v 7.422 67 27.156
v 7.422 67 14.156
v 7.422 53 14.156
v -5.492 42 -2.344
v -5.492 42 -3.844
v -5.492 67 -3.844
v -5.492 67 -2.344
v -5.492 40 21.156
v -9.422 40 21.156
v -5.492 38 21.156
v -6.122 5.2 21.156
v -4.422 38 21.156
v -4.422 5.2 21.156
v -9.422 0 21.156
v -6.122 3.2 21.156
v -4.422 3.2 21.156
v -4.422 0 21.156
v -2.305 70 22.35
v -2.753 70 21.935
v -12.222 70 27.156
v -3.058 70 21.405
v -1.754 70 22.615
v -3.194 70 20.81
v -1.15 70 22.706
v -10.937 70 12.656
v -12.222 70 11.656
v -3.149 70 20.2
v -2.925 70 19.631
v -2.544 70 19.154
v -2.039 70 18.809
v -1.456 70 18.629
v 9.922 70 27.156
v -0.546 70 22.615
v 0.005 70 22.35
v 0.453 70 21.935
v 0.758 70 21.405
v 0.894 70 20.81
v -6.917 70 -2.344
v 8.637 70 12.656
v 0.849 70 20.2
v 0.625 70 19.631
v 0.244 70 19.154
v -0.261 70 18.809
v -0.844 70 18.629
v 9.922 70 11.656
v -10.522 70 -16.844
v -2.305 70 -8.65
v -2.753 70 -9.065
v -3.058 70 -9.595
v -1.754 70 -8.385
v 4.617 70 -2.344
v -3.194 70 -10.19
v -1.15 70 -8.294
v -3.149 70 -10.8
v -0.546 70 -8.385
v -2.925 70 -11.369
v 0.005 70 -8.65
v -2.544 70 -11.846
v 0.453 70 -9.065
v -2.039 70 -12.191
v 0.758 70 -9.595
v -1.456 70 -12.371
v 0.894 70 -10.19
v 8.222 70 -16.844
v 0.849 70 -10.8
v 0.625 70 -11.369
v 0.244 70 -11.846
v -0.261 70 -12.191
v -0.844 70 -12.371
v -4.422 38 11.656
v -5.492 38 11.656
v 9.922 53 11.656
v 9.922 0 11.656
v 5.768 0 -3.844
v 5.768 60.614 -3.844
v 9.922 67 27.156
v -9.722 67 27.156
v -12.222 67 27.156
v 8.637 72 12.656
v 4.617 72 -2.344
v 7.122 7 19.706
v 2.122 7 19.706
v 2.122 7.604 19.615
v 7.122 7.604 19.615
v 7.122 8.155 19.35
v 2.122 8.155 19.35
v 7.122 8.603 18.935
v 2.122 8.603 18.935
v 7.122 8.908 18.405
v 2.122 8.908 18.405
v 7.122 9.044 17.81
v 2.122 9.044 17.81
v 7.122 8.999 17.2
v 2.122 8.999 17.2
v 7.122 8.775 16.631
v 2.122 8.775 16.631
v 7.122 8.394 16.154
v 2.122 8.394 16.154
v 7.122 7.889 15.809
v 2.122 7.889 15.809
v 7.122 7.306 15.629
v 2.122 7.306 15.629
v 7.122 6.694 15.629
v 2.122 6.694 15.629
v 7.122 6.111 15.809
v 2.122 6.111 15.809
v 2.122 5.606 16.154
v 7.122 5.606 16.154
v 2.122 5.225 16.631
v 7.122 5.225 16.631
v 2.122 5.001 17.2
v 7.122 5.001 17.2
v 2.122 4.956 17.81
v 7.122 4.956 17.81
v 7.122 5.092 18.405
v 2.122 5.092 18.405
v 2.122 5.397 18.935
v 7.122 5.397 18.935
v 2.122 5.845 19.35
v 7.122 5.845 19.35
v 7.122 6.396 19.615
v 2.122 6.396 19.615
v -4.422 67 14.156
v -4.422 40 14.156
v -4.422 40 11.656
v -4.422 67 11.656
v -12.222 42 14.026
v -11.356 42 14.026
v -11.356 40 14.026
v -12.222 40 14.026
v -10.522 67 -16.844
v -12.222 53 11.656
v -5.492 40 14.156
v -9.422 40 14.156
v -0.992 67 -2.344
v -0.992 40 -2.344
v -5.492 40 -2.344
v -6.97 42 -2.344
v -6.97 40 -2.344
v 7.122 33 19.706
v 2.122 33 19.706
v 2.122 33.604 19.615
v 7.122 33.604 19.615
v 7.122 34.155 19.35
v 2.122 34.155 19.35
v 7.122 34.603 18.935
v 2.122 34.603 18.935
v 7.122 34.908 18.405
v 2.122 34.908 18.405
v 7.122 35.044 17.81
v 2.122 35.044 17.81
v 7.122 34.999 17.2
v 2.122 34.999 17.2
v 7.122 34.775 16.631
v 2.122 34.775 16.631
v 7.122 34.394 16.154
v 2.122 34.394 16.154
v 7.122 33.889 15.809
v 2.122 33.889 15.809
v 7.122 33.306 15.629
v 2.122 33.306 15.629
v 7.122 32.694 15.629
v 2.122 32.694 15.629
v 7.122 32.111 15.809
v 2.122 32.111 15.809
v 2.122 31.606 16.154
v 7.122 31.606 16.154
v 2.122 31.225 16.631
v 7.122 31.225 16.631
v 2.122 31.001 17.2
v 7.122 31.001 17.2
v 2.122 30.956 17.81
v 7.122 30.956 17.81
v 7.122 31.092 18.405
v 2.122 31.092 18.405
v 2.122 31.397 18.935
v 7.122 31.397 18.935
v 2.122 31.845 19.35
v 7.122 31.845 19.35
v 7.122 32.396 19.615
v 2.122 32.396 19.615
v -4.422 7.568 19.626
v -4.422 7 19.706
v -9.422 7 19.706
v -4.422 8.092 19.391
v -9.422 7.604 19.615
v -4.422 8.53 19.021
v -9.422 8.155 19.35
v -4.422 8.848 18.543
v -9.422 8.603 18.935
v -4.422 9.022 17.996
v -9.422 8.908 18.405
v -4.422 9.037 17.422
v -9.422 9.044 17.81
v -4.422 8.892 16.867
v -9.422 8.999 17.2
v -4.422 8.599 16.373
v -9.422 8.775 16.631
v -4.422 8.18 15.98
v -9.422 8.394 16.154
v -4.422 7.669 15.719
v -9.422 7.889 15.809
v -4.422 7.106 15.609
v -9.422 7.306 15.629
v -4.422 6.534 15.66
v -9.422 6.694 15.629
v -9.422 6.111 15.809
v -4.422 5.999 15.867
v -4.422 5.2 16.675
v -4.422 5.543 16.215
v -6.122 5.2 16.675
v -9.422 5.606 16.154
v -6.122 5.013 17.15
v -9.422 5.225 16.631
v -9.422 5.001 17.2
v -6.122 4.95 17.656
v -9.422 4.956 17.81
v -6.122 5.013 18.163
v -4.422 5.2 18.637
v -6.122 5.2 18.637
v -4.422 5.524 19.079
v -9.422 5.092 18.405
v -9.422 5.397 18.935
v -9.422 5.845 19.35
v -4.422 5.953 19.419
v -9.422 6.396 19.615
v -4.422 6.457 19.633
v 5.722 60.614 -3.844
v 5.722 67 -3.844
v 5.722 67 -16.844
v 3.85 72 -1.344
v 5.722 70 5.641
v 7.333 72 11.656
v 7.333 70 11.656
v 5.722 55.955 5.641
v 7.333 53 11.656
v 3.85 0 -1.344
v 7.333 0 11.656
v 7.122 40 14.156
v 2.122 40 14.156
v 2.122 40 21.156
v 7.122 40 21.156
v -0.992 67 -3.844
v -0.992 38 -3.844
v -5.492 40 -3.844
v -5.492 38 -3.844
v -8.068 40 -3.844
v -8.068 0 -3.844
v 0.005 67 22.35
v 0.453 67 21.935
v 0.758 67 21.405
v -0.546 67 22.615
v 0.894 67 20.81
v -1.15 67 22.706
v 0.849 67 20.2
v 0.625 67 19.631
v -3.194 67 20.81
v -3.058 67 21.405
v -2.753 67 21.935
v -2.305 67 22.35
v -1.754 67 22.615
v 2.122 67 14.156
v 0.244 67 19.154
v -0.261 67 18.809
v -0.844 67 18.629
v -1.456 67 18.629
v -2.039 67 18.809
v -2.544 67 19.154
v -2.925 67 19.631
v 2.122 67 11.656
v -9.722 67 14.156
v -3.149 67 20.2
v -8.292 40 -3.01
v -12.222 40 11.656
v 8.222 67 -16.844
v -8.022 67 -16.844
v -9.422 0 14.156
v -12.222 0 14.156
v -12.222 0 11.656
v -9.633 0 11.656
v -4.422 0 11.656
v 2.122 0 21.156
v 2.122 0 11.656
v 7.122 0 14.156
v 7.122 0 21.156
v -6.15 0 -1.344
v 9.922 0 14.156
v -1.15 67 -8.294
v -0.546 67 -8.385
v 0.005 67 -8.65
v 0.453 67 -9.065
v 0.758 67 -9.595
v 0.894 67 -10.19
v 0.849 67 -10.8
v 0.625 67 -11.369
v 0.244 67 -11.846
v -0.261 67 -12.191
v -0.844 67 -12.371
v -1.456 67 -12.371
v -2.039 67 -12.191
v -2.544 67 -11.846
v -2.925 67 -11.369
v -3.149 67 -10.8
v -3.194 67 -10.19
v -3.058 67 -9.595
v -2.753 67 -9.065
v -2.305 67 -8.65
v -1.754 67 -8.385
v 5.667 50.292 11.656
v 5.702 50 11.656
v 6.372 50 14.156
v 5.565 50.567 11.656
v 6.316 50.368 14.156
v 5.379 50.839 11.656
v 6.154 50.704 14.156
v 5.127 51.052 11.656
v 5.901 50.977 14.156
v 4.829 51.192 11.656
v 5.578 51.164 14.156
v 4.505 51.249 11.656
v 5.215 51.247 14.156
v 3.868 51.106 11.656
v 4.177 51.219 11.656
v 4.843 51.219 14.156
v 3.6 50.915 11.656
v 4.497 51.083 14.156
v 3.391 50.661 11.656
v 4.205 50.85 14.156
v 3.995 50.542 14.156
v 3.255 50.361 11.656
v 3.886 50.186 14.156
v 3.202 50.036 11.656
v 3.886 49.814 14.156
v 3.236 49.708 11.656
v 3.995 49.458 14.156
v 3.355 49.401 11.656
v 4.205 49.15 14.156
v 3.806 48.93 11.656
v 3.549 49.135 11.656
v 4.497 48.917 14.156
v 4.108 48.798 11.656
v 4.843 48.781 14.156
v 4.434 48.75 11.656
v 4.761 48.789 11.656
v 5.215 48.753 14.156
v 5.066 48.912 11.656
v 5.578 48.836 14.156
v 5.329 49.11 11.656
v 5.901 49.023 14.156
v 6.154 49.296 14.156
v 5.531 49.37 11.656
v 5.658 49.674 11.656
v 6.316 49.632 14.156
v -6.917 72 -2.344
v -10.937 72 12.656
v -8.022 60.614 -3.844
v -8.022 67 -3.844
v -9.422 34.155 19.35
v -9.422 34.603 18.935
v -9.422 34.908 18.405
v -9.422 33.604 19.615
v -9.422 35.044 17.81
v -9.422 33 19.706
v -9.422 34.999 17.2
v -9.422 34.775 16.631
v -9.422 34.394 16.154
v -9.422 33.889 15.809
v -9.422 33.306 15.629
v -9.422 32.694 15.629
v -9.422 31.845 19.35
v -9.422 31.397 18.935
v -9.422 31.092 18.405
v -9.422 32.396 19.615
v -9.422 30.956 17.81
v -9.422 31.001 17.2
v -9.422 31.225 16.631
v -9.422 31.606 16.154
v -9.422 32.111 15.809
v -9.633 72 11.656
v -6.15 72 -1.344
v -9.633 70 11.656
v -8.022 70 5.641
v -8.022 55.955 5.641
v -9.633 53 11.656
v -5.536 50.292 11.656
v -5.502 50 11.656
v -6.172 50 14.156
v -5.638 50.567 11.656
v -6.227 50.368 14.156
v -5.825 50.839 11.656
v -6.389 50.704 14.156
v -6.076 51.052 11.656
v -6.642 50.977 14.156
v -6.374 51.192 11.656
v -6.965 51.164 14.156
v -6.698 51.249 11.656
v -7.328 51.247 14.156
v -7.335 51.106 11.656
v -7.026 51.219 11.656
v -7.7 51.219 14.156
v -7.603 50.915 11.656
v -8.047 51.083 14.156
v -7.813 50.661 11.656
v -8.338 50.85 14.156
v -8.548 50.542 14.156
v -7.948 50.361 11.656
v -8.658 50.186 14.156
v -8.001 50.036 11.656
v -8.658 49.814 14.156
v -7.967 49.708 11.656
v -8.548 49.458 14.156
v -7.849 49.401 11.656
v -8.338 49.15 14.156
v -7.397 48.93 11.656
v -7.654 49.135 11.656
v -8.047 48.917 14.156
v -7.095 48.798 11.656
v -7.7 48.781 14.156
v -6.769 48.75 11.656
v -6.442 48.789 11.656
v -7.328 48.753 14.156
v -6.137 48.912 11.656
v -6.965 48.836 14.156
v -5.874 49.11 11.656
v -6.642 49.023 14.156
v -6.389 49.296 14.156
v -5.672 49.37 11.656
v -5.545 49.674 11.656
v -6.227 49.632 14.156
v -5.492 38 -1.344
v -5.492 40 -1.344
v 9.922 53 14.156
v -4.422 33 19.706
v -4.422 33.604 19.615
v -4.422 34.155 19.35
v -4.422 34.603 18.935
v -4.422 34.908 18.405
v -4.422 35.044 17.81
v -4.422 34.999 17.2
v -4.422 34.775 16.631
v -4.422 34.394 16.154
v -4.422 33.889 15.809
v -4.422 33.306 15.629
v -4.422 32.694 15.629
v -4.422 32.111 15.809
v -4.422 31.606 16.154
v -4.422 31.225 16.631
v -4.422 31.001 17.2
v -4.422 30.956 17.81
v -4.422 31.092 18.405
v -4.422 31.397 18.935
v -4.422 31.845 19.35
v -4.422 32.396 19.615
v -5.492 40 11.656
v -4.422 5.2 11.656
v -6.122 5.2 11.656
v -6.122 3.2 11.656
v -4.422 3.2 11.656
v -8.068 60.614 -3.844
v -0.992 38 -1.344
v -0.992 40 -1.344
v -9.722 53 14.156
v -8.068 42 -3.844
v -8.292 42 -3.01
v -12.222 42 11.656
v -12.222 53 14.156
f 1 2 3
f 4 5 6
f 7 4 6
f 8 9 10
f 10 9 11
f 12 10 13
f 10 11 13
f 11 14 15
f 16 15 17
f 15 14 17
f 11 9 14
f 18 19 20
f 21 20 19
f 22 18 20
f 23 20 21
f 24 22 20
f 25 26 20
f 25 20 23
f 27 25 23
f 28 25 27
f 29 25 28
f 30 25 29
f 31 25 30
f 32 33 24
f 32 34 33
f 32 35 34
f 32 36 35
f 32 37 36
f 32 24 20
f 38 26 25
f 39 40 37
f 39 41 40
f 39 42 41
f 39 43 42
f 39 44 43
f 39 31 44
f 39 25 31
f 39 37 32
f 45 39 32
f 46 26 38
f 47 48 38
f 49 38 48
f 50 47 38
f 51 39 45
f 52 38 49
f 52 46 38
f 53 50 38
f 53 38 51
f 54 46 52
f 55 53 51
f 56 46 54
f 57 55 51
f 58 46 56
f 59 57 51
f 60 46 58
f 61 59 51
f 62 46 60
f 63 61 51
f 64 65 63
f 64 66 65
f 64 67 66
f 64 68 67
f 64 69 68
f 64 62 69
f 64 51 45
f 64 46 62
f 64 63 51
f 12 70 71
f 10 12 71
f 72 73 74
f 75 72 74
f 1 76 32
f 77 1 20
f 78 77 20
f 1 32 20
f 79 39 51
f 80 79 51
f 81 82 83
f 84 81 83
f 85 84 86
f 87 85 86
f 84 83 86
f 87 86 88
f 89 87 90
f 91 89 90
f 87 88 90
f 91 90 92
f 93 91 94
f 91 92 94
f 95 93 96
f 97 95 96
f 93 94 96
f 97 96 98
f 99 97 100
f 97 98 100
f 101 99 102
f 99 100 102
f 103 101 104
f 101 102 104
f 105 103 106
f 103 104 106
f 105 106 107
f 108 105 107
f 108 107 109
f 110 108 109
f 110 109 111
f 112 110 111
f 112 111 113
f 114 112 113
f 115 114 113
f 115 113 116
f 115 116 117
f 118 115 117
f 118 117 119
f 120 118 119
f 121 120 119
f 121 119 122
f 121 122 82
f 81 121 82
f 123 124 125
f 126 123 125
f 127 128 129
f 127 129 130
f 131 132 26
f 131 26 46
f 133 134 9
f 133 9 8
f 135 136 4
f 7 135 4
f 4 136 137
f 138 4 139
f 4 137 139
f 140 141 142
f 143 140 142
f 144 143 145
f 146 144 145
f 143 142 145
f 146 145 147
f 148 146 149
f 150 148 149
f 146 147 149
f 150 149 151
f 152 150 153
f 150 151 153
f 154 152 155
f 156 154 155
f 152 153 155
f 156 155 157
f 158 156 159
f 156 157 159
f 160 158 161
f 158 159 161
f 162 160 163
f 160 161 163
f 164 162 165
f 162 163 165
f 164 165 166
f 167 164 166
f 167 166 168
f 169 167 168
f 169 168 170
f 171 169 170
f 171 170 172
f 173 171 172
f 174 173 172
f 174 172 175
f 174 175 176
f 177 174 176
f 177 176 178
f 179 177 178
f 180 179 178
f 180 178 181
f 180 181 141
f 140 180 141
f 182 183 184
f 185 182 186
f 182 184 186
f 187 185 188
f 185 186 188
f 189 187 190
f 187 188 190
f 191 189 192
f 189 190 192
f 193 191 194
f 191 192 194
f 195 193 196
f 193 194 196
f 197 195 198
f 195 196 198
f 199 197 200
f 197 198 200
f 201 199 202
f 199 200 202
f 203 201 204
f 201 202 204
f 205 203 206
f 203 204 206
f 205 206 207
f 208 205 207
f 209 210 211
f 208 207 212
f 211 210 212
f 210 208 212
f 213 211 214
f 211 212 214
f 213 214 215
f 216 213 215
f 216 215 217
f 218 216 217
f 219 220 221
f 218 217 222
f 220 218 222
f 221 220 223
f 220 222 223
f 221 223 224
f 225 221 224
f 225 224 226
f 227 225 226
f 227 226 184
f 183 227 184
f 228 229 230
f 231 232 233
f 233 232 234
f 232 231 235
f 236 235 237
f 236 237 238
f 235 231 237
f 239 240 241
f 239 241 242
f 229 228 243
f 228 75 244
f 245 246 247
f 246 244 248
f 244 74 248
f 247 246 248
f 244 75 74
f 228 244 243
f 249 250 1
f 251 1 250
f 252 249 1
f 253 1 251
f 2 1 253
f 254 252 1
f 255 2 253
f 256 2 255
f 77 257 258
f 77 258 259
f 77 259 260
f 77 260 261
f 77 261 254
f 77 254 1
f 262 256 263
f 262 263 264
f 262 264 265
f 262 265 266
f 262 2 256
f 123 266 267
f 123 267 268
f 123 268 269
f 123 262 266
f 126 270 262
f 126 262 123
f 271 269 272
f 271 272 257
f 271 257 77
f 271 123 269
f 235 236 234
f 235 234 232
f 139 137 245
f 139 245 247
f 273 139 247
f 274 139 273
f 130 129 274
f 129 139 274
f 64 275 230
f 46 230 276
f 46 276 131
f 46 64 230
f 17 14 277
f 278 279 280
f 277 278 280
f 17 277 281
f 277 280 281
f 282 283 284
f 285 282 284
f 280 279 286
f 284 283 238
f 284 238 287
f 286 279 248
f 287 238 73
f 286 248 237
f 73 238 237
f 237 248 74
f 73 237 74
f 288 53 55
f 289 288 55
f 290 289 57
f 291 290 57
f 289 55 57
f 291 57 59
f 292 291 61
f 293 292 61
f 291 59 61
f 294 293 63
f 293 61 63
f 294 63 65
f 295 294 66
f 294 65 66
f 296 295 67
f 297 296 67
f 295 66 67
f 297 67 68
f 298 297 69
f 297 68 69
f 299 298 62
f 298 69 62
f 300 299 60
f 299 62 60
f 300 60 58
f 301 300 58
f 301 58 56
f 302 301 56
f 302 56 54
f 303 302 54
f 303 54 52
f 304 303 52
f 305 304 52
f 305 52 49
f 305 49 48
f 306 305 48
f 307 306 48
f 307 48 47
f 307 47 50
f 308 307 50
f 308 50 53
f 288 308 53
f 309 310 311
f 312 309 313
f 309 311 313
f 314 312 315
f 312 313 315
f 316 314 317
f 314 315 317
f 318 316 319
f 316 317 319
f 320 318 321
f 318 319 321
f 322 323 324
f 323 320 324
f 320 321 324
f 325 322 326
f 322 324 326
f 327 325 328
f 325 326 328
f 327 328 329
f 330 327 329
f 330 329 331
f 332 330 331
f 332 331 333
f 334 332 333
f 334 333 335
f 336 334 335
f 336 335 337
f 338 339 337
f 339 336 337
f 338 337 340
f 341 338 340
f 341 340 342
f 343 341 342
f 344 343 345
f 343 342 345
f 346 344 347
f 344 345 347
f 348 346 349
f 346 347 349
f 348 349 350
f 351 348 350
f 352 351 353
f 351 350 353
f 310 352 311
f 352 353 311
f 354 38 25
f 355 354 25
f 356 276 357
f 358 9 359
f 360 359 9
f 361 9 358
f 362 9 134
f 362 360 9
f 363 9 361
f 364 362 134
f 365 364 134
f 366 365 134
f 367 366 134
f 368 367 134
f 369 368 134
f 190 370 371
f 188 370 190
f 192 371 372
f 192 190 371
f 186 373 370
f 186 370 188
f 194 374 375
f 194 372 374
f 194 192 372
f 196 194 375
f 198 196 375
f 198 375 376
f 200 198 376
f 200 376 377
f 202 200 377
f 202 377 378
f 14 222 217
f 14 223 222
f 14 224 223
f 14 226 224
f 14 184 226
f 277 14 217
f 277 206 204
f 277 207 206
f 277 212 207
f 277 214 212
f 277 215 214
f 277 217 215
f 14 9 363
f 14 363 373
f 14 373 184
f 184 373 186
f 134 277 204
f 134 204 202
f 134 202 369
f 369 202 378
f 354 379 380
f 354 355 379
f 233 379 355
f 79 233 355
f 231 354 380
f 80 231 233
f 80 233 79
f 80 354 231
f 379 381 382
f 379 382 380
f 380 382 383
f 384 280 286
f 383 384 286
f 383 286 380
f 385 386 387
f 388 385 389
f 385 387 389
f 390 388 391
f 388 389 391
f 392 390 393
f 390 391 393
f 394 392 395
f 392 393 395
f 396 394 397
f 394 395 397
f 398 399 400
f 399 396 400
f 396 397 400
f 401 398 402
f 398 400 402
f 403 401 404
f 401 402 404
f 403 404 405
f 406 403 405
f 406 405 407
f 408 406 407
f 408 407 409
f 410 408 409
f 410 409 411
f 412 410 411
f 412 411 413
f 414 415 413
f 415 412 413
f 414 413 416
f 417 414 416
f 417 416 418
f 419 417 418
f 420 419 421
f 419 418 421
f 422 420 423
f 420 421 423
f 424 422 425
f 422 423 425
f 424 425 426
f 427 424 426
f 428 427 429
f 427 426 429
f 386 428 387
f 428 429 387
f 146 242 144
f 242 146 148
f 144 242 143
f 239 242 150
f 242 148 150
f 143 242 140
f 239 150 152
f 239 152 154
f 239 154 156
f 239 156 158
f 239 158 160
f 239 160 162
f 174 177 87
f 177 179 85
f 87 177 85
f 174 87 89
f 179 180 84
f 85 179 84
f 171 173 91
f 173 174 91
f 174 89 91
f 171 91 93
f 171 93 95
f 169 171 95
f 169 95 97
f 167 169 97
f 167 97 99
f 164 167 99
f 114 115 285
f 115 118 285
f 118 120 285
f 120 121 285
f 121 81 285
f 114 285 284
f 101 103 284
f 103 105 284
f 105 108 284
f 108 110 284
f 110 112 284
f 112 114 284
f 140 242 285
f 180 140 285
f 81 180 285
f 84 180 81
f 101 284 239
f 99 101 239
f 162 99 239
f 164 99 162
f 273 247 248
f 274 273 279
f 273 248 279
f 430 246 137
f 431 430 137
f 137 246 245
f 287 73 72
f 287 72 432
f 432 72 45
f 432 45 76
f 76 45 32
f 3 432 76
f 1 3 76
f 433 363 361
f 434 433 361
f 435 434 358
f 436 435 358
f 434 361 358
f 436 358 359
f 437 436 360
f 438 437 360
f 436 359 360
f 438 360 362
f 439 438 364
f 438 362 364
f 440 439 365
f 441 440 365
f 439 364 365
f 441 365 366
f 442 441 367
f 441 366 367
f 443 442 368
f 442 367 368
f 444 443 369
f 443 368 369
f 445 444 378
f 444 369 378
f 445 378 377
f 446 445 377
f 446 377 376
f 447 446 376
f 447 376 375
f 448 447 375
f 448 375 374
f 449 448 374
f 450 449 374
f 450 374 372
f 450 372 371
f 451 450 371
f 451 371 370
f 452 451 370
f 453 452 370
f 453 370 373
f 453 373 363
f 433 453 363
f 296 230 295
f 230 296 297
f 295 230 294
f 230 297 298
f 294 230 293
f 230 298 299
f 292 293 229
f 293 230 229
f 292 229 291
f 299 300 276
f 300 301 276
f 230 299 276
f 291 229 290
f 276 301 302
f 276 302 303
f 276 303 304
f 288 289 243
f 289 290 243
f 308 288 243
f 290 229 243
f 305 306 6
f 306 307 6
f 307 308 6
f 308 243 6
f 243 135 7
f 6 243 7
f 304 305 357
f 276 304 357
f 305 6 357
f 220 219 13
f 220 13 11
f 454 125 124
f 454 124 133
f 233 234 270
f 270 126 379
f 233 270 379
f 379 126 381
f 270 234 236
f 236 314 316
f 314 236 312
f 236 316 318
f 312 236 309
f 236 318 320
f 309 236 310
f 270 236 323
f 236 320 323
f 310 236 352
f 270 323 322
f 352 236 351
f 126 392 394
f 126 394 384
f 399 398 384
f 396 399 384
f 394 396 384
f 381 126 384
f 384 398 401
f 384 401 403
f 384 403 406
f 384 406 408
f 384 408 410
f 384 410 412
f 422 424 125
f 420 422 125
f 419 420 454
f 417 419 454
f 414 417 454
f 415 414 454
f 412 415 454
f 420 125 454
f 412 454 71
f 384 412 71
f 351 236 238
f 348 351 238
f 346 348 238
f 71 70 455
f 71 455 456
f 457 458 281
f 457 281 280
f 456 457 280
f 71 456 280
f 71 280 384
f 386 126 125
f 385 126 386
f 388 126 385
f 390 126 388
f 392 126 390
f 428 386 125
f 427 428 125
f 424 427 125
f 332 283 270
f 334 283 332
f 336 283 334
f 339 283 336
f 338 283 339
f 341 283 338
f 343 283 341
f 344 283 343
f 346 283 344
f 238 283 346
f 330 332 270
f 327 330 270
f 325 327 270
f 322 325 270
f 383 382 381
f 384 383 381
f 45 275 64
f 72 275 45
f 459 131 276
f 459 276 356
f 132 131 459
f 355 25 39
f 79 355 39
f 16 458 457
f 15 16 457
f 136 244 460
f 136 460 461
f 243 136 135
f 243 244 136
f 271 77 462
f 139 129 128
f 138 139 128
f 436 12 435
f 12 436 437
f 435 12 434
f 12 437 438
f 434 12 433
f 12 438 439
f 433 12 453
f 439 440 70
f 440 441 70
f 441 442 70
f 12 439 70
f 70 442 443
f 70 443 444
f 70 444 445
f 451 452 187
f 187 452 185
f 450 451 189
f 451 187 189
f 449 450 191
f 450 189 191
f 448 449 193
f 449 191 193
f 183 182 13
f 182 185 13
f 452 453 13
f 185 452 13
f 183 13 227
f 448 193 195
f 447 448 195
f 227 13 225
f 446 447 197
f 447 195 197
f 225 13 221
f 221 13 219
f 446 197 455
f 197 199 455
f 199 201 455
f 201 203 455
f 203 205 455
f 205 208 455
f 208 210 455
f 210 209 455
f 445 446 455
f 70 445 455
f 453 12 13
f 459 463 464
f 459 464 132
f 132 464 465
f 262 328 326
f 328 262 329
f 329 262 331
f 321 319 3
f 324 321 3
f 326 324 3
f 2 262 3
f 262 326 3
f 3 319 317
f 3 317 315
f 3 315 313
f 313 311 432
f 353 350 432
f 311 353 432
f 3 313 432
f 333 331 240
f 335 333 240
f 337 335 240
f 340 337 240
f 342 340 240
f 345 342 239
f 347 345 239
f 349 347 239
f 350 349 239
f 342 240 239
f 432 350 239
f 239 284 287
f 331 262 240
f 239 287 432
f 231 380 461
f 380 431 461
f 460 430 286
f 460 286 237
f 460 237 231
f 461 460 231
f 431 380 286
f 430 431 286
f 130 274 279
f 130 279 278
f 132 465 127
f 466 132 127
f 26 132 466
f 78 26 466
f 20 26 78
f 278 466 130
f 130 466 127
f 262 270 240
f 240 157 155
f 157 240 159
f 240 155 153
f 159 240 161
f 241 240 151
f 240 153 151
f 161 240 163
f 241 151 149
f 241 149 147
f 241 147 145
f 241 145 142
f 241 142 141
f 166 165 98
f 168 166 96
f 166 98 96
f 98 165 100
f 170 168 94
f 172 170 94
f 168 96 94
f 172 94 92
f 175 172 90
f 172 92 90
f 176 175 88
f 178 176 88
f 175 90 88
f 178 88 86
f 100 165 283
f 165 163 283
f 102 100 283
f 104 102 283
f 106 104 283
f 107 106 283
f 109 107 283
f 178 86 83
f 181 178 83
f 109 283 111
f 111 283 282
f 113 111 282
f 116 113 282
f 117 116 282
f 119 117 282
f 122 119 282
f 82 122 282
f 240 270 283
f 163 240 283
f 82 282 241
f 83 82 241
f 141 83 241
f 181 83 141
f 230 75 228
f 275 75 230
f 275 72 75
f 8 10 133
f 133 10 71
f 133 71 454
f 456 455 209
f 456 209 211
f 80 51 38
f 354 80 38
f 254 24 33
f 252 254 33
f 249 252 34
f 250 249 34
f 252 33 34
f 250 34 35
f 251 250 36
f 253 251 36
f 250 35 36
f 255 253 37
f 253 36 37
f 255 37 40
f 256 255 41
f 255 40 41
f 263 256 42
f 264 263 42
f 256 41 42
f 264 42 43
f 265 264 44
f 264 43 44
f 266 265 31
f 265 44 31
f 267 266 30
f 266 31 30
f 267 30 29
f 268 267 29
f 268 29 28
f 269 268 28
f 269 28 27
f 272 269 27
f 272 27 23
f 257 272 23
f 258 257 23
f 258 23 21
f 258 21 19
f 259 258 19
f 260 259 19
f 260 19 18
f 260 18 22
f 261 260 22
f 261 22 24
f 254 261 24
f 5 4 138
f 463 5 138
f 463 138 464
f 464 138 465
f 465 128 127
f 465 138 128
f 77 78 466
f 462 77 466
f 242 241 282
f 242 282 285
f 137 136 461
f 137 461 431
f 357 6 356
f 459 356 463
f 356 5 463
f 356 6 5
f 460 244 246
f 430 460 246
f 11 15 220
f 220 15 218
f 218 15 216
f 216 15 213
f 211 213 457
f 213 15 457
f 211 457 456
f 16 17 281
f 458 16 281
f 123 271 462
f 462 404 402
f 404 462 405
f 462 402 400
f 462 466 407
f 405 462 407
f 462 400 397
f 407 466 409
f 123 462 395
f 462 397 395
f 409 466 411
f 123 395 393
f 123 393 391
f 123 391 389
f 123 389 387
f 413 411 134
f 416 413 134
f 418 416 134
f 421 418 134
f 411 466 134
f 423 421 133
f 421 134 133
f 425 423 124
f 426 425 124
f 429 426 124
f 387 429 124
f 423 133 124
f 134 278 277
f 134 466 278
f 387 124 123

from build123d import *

# Parameters (mm, degrees)
SKETCH2_W                = 5
SKETCH2_H                = 7
BOSS_EXTRUDE1_DEPTH      = 40
SKETCH3_R                = 2.05
CUT_EXTRUDE2_DEPTH       = 40
BOSS_EXTRUDE2_DEPTH      = 30
SKETCH7_W                = 4.5
SKETCH7_H                = 2
CUT_EXTRUDE3_DEPTH       = 76.328383431
SKETCH8_W                = 1.7
SKETCH8_H                = 2
CUT_EXTRUDE4_DEPTH       = 73.729741855
SKETCH9_W                = 6.543059906
SKETCH9_H                = 1
BOSS_EXTRUDE3_DEPTH      = 2
SKETCH10_W               = 4.5
SKETCH10_H               = 75
CUT_EXTRUDE5_DEPTH       = 1.5
SKETCH13_W               = 2.8
SKETCH13_H               = 2
CUT_EXTRUDE7_DEPTH       = 1.5
SKETCH15_W               = 1.5
SKETCH15_H               = 2
CUT_EXTRUDE8_DEPTH       = 18.5
SKETCH16_R               = 1.25
CUT_EXTRUDE9_DEPTH       = 3.5
SKETCH17_R               = 1.25
CUT_EXTRUDE10_DEPTH      = 3.5
SKETCH18_W               = 22.143059906
SKETCH18_H               = 3
BOSS_EXTRUDE4_DEPTH      = 15.5
BOSS_EXTRUDE5_DEPTH      = 13
BOSS_EXTRUDE5_DEPTH_BACK = 2
SKETCH19_W               = 13.83663494
SKETCH19_H               = 3
BOSS_EXTRUDE6_DEPTH      = 2.5
BOSS_EXTRUDE8_DEPTH      = 2.5
BOSS_EXTRUDE9_DEPTH      = 4.2
BOSS_EXTRUDE10_DEPTH     = 4.2
SKETCH25_R               = 2.05
CUT_EXTRUDE12_DEPTH      = 3.5
CUT_EXTRUDE13_DEPTH      = 71.528016285
CUT_EXTRUDE14_DEPTH      = 71.528016285


with BuildPart() as part:
    # Sketch2 → Boss-Extrude1 (new body)
    with BuildSketch(Plane(origin=(0, 0, 0), x_dir=(1, 0, 0), z_dir=(0, 1, 0))):
        Polygon((9.921548121, -11.656419986), (5.768335638, 3.843580014), (5.768335638, 1.343580014), (3.850018168, 1.343580014), (7.33335767, -11.656419986), align=None)
        Polygon((5.768335638, 3.843580014), (-8.068299302, 3.843580014), (-5.653484736, 3.196532402), (-6.149981832, 1.343580014), (3.850018168, 1.343580014), (3.353521072, 3.196532402), align=None)
        Polygon((-8.068299302, 1.343580014), (-8.068299302, 3.843580014), (-12.221511785, -11.656419986), (-9.633321334, -11.656419986), (-6.149981832, 1.343580014), align=None)
        Polygon((5.768335638, 1.343580014), (5.768335638, 3.843580014), (3.353521072, 3.196532402), (3.850018168, 1.343580014), align=None)
        Polygon((-5.653484736, 3.196532402), (-8.068299302, 3.843580014), (-8.068299302, 1.343580014), (-6.149981832, 1.343580014), align=None)
        Polygon((-9.806697219, -12.303467598), (-12.221511785, -11.656419986), (-12.221511785, -14.156419986), (-9.421511785, -14.156419986), (-4.421511785, -14.156419986), (-4.421511785, -11.656419986), (-9.633321334, -11.656419986), align=None)
        Polygon((-9.633321334, -11.656419986), (-12.221511785, -11.656419986), (-9.806697219, -12.303467598), align=None)
        Polygon((7.506733555, -12.303467598), (9.921548121, -11.656419986), (7.33335767, -11.656419986), align=None)
        Polygon((9.921548121, -14.156419986), (9.921548121, -11.656419986), (7.506733555, -12.303467598), (7.33335767, -11.656419986), (2.121548121, -11.656419986), (2.121548121, -14.156419986), (7.121548121, -14.156419986), align=None)
        with Locations((4.621548121, -17.656419986)):
            Rectangle(SKETCH2_W, SKETCH2_H)
        with Locations((-6.921511785, -17.656419986)):
            Rectangle(SKETCH2_W, SKETCH2_H)
    extrude(amount=BOSS_EXTRUDE1_DEPTH)

    # Sketch3 → Cut-Extrude2 (cut)
    with BuildSketch(Plane.ZY.offset(9.421511785)):
        with Locations((17.656419986, 33)):
            Circle(SKETCH3_R)
        with Locations((17.656419986, 7)):
            Circle(SKETCH3_R)
    extrude(amount=-CUT_EXTRUDE2_DEPTH, mode=Mode.SUBTRACT)

    # Sketch4 → Boss-Extrude2 (add)
    with BuildSketch(Plane(origin=(0, 40, 0), x_dir=(1, 0, 0), z_dir=(0, 1, 0))):
        Polygon((-4.421511785, -11.656419986), (-9.633321334, -11.656419986), (-6.149981832, 1.343580014), (3.850018168, 1.343580014), (7.33335767, -11.656419986), (2.121548121, -11.656419986), (2.121548121, -14.156419986), (7.121548121, -14.156419986), (9.921548121, -14.156419986), (9.921548121, -11.656419986), (5.768335638, 3.843580014), (-8.068299302, 3.843580014), (-12.221511785, -11.656419986), (-12.221511785, -14.156419986), (-9.421511785, -14.156419986), (-4.421511785, -14.156419986), align=None)
    extrude(amount=BOSS_EXTRUDE2_DEPTH)

    # Sketch7 → Cut-Extrude3 (cut, through all)
    with BuildSketch(Plane(origin=(0, 0, -3.843580014), x_dir=(-1, 0, 0), z_dir=(0, 0, -1))):
        with Locations((3.241664362, 39)):
            Rectangle(SKETCH7_W, SKETCH7_H)
    extrude(amount=-CUT_EXTRUDE3_DEPTH, mode=Mode.SUBTRACT)

    # Sketch8 → Cut-Extrude4 (cut, through all)
    with BuildSketch(Plane(origin=(0, 0, 11.656419986), x_dir=(-1, 0, 0), z_dir=(0, 0, -1))):
        with Locations((5.271511785, 4.2)):
            Rectangle(SKETCH8_W, SKETCH8_H)
    extrude(amount=-CUT_EXTRUDE4_DEPTH, mode=Mode.SUBTRACT)

    # Sketch9 → Boss-Extrude3 (add)
    with BuildSketch(Plane(origin=(0, 70, 0), x_dir=(1, 0, 0), z_dir=(0, 1, 0))):
        Polygon((7.33335767, -11.656419986), (2.121548121, -11.656419986), (2.121548121, -12.656419986), (8.636583042, -12.656419986), (4.617345156, 2.343580014), (-6.91730882, 2.343580014), (-10.936546706, -12.656419986), (-4.421511785, -12.656419986), (-4.421511785, -11.656419986), (-9.633321334, -11.656419986), (-6.149981832, 1.343580014), (3.850018168, 1.343580014), align=None)
        with Locations((-1.149981832, -12.156419986)):
            Rectangle(SKETCH9_W, SKETCH9_H)
    extrude(amount=BOSS_EXTRUDE3_DEPTH)

    # Sketch10 → Cut-Extrude5 (cut)
    with BuildSketch(Plane(origin=(0, 0, -3.843580014), x_dir=(-1, 0, 0), z_dir=(0, 0, -1))):
        with Locations((3.241664362, 77.5)):
            Rectangle(SKETCH10_W, SKETCH10_H)
    extrude(amount=-CUT_EXTRUDE5_DEPTH, mode=Mode.SUBTRACT)

    # Sketch13 → Cut-Extrude7 (cut)
    with BuildSketch(Plane(origin=(0, 0, -2.343580014), x_dir=(-1, 0, 0), z_dir=(0, 0, -1))):
        with Locations((6.891664362, 41)):
            Rectangle(SKETCH13_W, SKETCH13_H)
    extrude(amount=CUT_EXTRUDE7_DEPTH, mode=Mode.SUBTRACT)

    # Sketch15 → Cut-Extrude8 (cut, along a direction that is not the sketch's normal)
    with BuildSketch(Plane(origin=(0, 0, -3.843580014), x_dir=(-1, 0, 0), z_dir=(0, 0, -1))):
        with Locations((7.318299302, 41)):
            Rectangle(SKETCH15_W, SKETCH15_H)
    extrude(amount=-CUT_EXTRUDE8_DEPTH, dir=(0.25881904510252474, 0, -0.9659258262890672), mode=Mode.SUBTRACT)

    # Sketch16 → Cut-Extrude9 (cut, along a direction that is not the sketch's normal)
    with BuildSketch(Plane.XY.offset(14.156419986)):
        with Locations((-7.421511785, 50)):
            Circle(SKETCH16_R)
    extrude(amount=-CUT_EXTRUDE9_DEPTH, dir=(-0.2588190451025246, 0, 0.9659258262890672), mode=Mode.SUBTRACT)

    # Sketch17 → Cut-Extrude10 (cut, along a direction that is not the sketch's normal)
    with BuildSketch(Plane.XY.offset(14.156419986)):
        with Locations((5.121548121, 50)):
            Circle(SKETCH17_R)
    extrude(amount=-CUT_EXTRUDE10_DEPTH, dir=(0.25881904510251796, 0, 0.9659258262890691), mode=Mode.SUBTRACT)

    # Sketch18 → Boss-Extrude4 (add)
    with BuildSketch(Plane(origin=(0, 0, 11.656419986), x_dir=(-1, 0, 0), z_dir=(0, 0, -1))):
        with Locations((1.149981832, 68.5)):
            Rectangle(SKETCH18_W, SKETCH18_H)
    extrude(amount=-BOSS_EXTRUDE4_DEPTH)

    # Sketch19 → Boss-Extrude5 (add, two sides: drawn at the far end of the back side and taken through both)
    with BuildSketch(Plane(origin=(0, 0, -3.843580014), x_dir=(-1, 0, 0), z_dir=(0, 0, -1)).offset(-BOSS_EXTRUDE5_DEPTH_BACK)):
        with Locations((1.149981832, 68.5)):
            Rectangle(SKETCH19_W, SKETCH19_H)
    extrude(amount=BOSS_EXTRUDE5_DEPTH + BOSS_EXTRUDE5_DEPTH_BACK)

    # Sketch21 → Boss-Extrude6 (add)
    with BuildSketch(Plane.ZY.offset(12.221511785)):
        Polygon((27.156419986, 67), (14.156419986, 53), (14.156419986, 67), align=None)
    extrude(amount=-BOSS_EXTRUDE6_DEPTH)

    # Sketch22 → Boss-Extrude8 (add)
    with BuildSketch(Plane(origin=(9.921548121, 0, 0), x_dir=(0, 0, -1), z_dir=(1, 0, 0))):
        Polygon((-27.156419986, 67), (-14.156419986, 67), (-14.156419986, 53), align=None)
    extrude(amount=-BOSS_EXTRUDE8_DEPTH)

    # Sketch23 → Boss-Extrude9 (add)
    with BuildSketch(Plane(origin=(9.921548121, 0, 0), x_dir=(0, 0, -1), z_dir=(1, 0, 0))):
        Polygon((-11.656419986, 70), (-11.656419986, 53), (16.843580014, 67), (16.843580014, 70), align=None)
    extrude(amount=-BOSS_EXTRUDE9_DEPTH)

    # Sketch24 → Boss-Extrude10 (add)
    with BuildSketch(Plane.ZY.offset(12.221511785)):
        Polygon((11.656419986, 70), (-16.843580014, 70), (-16.843580014, 67), (11.656419986, 53), align=None)
    extrude(amount=-BOSS_EXTRUDE10_DEPTH)

    # Sketch25 → Cut-Extrude12 (cut)
    with BuildSketch(Plane(origin=(0, 70, 0), x_dir=(1, 0, 0), z_dir=(0, 1, 0))):
        with Locations(Location((-1.149981694, 10.343580014, 0), (0, 0, 270))):
            Circle(SKETCH25_R)
        with Locations(Location((-1.149981723, -20.656419986, 0), (0, 0, 270))):
            Circle(SKETCH25_R)
    extrude(amount=-CUT_EXTRUDE12_DEPTH, mode=Mode.SUBTRACT)

    # Sketch26 → Cut-Extrude13 (cut, through all, along a direction that is not the sketch's normal)
    with BuildSketch(Plane(origin=(0, 47.309855268, 23.239928904), x_dir=(-1, 0, 0), z_dir=(-4.742047126241555e-14, -0.8975543264374147, -0.4409038796534669))):
        Polygon((-5.721548121, 12.905635433), (-7.33335767, 12.905635433), (-5.721548121, 19.607575306), align=None)
        Polygon((8.021511785, 12.905635433), (8.021511785, 19.607575306), (9.633321334, 12.905635433), align=None)
    extrude(amount=-CUT_EXTRUDE13_DEPTH, dir=(0, -1, 0), mode=Mode.SUBTRACT)

    # Sketch27 → Cut-Extrude14 (cut, through all, along a direction that is not the sketch's normal)
    with BuildSketch(Plane(origin=(0, 47.309855268, 23.239928904), x_dir=(-1, 0, 0), z_dir=(0, -0.8975543264374147, -0.440903879653467))):
        Polygon((12.221511785, 12.905635433), (10.521511785, 44.658588051), (12.221511785, 44.658588051), align=None)
        Polygon((-9.921548121, 12.905635433), (-9.921548121, 44.658588051), (-8.221548121, 44.658588051), align=None)
    extrude(amount=-CUT_EXTRUDE14_DEPTH, dir=(0, -1, 0), mode=Mode.SUBTRACT)


solid = part.part
